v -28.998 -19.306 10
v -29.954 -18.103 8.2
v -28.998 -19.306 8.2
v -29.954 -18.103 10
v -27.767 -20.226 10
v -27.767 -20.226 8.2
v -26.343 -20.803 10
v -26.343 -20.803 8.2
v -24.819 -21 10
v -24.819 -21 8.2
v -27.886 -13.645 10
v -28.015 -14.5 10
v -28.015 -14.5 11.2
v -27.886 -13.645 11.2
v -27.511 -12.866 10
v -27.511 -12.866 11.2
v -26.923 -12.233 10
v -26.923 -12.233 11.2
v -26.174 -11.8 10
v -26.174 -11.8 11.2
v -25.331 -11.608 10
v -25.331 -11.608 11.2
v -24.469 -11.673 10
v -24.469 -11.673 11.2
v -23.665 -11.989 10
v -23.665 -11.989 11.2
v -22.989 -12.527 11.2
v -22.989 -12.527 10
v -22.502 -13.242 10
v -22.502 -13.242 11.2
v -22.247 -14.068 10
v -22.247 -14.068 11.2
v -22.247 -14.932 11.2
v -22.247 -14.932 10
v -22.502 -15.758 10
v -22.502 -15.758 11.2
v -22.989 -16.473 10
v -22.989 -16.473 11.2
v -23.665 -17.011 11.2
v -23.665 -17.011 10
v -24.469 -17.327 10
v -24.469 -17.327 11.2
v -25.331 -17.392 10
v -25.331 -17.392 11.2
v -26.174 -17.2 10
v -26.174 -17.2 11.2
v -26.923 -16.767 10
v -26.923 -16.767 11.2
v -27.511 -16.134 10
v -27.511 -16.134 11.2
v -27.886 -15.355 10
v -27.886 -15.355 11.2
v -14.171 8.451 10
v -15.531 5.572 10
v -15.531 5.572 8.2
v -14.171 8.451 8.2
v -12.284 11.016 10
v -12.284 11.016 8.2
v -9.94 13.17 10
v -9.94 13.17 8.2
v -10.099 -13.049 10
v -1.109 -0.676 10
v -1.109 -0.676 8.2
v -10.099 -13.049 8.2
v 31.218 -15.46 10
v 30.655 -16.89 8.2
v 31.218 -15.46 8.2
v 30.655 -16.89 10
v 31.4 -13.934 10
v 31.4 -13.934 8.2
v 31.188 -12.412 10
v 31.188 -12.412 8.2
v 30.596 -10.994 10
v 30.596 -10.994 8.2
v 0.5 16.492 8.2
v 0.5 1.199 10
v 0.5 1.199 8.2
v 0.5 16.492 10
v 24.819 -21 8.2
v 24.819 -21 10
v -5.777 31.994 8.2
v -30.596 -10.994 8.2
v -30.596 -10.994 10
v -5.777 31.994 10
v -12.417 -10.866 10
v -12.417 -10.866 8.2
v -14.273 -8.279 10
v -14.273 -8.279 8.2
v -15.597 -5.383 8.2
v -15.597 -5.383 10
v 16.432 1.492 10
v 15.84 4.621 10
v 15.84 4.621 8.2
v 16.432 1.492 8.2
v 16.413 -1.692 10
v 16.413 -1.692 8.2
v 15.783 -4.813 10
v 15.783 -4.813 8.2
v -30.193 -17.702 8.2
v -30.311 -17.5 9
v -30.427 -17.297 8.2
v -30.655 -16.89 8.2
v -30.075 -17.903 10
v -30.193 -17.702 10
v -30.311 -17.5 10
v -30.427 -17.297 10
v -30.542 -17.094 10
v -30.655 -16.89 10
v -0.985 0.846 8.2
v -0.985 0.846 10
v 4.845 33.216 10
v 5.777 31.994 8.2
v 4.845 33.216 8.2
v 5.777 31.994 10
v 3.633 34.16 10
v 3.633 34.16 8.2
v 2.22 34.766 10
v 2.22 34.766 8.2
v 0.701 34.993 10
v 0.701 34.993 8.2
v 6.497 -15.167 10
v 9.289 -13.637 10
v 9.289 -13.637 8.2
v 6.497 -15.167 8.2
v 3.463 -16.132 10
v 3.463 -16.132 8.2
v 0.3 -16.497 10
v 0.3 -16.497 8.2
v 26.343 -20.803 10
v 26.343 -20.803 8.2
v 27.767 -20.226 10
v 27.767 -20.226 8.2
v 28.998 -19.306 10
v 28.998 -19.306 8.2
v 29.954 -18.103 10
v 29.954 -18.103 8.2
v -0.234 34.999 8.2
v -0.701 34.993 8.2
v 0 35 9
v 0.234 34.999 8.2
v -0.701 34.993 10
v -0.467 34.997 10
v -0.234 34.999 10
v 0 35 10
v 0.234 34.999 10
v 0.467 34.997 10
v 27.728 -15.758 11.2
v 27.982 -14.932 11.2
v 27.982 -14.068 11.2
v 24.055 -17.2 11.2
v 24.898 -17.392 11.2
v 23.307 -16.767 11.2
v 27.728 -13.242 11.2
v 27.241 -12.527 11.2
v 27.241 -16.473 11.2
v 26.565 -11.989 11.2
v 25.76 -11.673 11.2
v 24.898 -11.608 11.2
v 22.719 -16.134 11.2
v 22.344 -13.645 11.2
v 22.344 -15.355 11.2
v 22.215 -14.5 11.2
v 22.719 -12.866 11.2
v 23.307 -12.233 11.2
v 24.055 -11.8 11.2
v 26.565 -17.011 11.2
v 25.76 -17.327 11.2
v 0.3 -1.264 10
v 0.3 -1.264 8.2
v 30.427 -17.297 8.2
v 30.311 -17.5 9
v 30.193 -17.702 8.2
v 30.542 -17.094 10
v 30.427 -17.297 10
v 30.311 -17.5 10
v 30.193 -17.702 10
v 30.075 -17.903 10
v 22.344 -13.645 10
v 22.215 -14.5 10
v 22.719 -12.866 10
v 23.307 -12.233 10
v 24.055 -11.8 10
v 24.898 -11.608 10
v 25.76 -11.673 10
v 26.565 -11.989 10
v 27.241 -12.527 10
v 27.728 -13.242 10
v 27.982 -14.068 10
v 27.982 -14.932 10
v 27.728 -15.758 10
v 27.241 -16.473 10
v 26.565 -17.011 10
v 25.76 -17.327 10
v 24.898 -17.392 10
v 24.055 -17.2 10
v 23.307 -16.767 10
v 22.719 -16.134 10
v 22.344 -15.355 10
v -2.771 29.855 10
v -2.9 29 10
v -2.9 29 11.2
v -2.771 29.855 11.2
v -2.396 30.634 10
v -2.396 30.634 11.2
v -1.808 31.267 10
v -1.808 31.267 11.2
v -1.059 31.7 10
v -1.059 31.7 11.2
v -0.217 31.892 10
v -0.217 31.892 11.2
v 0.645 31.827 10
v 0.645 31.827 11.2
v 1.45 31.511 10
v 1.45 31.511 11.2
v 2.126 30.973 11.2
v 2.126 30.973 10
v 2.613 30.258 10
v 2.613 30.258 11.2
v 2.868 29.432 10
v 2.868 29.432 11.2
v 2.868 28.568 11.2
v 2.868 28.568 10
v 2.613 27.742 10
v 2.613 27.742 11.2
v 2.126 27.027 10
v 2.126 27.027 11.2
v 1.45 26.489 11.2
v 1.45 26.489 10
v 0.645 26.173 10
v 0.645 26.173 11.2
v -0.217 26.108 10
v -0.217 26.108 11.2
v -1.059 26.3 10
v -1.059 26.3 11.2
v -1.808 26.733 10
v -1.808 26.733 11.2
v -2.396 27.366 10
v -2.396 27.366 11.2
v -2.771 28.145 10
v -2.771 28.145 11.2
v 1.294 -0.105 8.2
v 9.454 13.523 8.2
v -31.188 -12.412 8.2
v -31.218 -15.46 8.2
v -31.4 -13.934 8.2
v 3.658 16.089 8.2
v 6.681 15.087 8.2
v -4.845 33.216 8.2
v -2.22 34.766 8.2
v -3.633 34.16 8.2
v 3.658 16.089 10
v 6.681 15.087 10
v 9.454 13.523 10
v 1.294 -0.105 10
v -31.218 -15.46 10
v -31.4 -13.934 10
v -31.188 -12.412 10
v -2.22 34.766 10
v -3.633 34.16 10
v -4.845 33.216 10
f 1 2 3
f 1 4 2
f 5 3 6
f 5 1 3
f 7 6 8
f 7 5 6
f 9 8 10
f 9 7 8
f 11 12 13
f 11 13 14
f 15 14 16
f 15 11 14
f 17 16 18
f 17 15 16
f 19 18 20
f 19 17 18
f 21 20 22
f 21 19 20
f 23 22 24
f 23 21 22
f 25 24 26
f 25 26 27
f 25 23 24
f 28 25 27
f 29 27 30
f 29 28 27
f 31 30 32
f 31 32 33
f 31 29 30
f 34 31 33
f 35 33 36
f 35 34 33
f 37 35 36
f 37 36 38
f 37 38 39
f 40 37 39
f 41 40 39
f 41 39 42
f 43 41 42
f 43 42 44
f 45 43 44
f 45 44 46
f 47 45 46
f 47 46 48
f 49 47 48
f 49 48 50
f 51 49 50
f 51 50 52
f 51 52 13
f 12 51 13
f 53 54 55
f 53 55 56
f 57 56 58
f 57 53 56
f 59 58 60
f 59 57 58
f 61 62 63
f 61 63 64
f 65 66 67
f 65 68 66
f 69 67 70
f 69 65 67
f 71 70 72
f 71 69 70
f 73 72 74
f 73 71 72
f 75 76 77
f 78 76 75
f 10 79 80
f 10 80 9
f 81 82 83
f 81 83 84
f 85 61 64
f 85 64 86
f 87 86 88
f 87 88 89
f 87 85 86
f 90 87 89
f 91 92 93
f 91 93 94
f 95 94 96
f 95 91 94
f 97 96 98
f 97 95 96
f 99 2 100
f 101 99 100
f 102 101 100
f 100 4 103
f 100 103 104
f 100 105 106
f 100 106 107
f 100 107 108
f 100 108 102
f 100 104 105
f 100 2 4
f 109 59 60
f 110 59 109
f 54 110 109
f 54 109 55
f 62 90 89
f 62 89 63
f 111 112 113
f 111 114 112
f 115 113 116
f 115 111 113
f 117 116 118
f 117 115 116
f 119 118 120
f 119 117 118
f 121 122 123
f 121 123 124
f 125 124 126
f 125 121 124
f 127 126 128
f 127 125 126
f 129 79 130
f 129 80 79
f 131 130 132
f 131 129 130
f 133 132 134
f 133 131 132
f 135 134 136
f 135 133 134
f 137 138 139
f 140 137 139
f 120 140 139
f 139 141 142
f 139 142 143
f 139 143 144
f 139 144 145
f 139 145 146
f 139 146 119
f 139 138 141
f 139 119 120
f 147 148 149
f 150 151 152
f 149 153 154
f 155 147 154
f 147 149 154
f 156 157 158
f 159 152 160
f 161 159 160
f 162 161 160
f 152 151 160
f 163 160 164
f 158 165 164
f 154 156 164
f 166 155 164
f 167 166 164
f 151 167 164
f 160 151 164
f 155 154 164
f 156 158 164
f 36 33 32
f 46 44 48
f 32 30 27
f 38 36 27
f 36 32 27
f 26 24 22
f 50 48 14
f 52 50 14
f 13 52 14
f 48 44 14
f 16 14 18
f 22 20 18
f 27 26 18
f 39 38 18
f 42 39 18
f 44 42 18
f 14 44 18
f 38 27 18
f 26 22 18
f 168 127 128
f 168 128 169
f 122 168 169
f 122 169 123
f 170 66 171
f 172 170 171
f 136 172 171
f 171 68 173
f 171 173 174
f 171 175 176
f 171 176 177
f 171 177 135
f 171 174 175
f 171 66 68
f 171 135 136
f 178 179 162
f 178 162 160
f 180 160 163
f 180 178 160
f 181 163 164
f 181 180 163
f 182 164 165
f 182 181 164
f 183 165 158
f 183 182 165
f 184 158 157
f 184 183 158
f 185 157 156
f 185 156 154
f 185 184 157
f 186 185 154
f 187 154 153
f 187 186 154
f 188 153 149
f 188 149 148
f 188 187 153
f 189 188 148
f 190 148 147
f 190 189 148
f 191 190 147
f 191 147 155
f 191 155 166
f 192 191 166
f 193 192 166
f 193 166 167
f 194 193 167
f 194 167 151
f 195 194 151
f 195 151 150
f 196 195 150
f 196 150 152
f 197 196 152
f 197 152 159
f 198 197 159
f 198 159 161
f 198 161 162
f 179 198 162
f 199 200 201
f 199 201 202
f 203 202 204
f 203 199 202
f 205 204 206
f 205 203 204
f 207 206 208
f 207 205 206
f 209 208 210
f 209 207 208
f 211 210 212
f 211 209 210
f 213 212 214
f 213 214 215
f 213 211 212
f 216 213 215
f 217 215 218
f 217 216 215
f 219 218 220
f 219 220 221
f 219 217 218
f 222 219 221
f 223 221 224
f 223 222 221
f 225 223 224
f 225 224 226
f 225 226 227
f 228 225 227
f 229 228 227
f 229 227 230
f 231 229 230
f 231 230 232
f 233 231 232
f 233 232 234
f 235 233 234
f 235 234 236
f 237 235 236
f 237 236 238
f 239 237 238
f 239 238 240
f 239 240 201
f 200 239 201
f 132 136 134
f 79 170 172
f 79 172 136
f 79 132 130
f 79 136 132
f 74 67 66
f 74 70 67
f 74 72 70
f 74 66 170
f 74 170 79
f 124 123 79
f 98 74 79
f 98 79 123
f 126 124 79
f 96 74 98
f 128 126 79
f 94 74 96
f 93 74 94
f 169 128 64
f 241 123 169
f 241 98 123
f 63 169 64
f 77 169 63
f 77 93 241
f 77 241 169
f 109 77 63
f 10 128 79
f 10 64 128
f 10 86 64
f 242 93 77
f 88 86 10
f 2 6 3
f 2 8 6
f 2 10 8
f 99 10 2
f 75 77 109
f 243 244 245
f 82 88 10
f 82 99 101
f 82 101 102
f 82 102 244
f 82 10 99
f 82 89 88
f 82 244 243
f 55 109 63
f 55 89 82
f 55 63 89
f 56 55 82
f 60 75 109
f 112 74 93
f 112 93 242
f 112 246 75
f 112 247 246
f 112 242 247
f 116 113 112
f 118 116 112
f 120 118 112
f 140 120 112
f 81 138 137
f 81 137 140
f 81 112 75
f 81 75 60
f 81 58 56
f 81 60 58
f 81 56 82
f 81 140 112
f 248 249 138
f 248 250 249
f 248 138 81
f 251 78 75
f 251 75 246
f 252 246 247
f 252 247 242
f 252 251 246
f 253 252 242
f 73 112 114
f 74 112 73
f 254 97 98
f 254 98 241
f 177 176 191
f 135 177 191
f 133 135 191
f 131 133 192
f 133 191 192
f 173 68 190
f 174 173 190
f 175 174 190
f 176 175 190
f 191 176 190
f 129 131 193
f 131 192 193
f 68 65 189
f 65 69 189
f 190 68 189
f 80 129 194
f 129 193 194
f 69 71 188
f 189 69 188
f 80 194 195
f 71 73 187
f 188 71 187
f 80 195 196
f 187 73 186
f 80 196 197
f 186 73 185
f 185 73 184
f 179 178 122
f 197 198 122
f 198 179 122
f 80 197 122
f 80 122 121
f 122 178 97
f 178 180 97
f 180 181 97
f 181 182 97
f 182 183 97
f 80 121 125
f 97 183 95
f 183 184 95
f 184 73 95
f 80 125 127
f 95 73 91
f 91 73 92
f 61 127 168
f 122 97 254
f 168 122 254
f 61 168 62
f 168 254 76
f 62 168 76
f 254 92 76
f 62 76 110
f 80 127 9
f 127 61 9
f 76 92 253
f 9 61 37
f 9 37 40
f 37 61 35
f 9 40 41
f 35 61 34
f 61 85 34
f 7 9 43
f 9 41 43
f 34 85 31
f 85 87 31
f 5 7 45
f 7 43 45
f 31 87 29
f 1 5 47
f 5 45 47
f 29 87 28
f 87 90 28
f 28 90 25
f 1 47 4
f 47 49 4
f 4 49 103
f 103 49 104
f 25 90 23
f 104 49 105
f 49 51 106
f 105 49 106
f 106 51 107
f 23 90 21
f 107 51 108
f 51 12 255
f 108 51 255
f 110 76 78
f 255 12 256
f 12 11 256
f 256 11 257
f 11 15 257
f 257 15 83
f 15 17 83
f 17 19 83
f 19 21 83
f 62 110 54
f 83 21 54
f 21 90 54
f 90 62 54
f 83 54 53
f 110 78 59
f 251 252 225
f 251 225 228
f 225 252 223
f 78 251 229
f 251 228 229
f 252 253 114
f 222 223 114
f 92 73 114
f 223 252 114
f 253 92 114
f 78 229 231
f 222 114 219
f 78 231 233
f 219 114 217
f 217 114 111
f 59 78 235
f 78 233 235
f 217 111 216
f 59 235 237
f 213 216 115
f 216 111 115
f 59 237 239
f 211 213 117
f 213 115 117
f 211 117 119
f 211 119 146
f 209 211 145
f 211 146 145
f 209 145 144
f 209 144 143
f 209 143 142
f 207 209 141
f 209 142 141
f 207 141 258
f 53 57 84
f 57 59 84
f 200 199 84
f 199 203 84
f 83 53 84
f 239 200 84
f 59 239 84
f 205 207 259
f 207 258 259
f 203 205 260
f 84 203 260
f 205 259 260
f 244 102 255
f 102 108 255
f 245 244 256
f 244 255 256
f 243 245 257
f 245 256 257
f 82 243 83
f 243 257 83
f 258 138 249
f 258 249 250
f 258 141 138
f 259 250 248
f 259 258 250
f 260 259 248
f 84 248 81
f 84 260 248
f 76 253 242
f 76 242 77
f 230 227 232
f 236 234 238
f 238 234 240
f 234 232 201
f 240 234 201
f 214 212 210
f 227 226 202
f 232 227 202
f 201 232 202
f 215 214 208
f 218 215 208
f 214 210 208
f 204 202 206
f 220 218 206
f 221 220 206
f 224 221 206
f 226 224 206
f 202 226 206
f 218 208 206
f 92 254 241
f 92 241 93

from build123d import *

# Parameters (mm, degrees)
SKETCH2_R           = 18
BOSS_EXTRUDE1_DEPTH = 1.8
BOSS_EXTRUDE7_START = -1.8
BOSS_EXTRUDE7_DEPTH = 1.8
SKETCH17_R          = 0.7
BOSS_EXTRUDE9_DEPTH = 1.8
BOSS_EXTRUDE2_START = -1.8
SKETCH3_R           = 35
SKETCH3_R_2         = 18
BOSS_EXTRUDE2_DEPTH = 1.8
SKETCH4_R           = 2.9
BOSS_EXTRUDE3_DEPTH = 3
SKETCH6_R           = 5
BOSS_EXTRUDE4_DEPTH = 1
SKETCH7_R           = 59.131365533
CUT_EXTRUDE1_DEPTH  = 10
FILLET1_R           = 6


with BuildPart() as part:
    # Sketch2 → Boss-Extrude1 (new body)
    with BuildSketch(Plane.XY.offset(10)):
        Circle(SKETCH2_R)
        with BuildLine():
            ThreePointArc((0, 0.538550206), (0.166421166, 0.512191682), (0.316551869, 0.435696269))
            Line((0.316551869, 0.435696269), (9.992349289, 13.753288904))
            ThreePointArc((9.992349289, 13.753288904), (13.753288904, 9.992349289), (16.167960777, 5.253288904))
            Line((16.167960777, 5.253288904), (0.512191682, 0.166421166))
            ThreePointArc((0.512191682, 0.166421166), (0.538550206, 0), (0.512191682, -0.166421166))
            Line((0.512191682, -0.166421166), (16.167960777, -5.253288904))
            ThreePointArc((16.167960777, -5.253288904), (13.753288904, -9.992349289), (9.992349289, -13.753288904))
            Line((9.992349289, -13.753288904), (0.316551869, -0.435696269))
            ThreePointArc((0.316551869, -0.435696269), (0.166421166, -0.512191682), (0, -0.538550206))
            Line((0, -0.538550206), (0, -17))
            ThreePointArc((0, -17), (-5.253288904, -16.167960777), (-9.992349289, -13.753288904))
            Line((-9.992349289, -13.753288904), (-0.316551869, -0.435696269))
            ThreePointArc((-0.316551869, -0.435696269), (-0.435696269, -0.316551869), (-0.512191682, -0.166421166))
            Line((-0.512191682, -0.166421166), (-16.167960777, -5.253288904))
            ThreePointArc((-16.167960777, -5.253288904), (-17, 0), (-16.167960777, 5.253288904))
            Line((-16.167960777, 5.253288904), (-0.512191682, 0.166421166))
            ThreePointArc((-0.512191682, 0.166421166), (-0.435696269, 0.316551869), (-0.316551869, 0.435696269))
            Line((-0.316551869, 0.435696269), (-9.992349289, 13.753288904))
            ThreePointArc((-9.992349289, 13.753288904), (-5.253288904, 16.167960777), (0, 17))
            Line((0, 17), (0, 0.538550206))
        make_face(mode=Mode.SUBTRACT)
        with BuildLine():
            Line((0.5, 1.198581445), (0.5, 16.492422502))
            ThreePointArc((0.5, 16.492422502), (5.193820321, 15.661233364), (9.454148381, 13.522909391))
            Line((9.454148381, 13.522909391), (0.5, 1.198581445))
        make_face(mode=Mode.SUBTRACT)
        with BuildLine():
            Line((-9.939558578, 13.170238239), (-0.985410197, 0.845910294))
            Line((-0.985410197, 0.845910294), (-15.530717393, 5.57196709))
            ThreePointArc((-15.530717393, 5.57196709), (-13.289739299, 9.779203923), (-9.939558578, 13.170238239))
        make_face(mode=Mode.SUBTRACT)
        with BuildLine():
            Line((-15.597133416, -5.383254519), (-1.109016994, -0.675780132))
            Line((-1.109016994, -0.675780132), (-10.098511219, -13.048757457))
            ThreePointArc((-10.098511219, -13.048757457), (-13.40733091, -9.617352956), (-15.597133416, -5.383254519))
        make_face(mode=Mode.SUBTRACT)
        with BuildLine():
            ThreePointArc((9.289494224, -13.636542709), (5.003553098, -15.723054932), (0.3, -16.497272502))
            Line((0.3, -16.497272502), (0.3, -1.263565384))
            Line((0.3, -1.263565384), (9.289494224, -13.636542709))
        make_face(mode=Mode.SUBTRACT)
        with BuildLine():
            Line((15.782543612, -4.812620609), (1.294427191, -0.105146222))
            Line((1.294427191, -0.105146222), (15.839734388, 4.620910574))
            ThreePointArc((15.839734388, 4.620910574), (16.499696789, -0.100029399), (15.782543612, -4.812620609))
        make_face(mode=Mode.SUBTRACT)
    extrude(amount=-BOSS_EXTRUDE1_DEPTH)

    # Sketch11 → Boss-Extrude7 (add)
    with BuildSketch(Plane(origin=(0, 0, 8.2), x_dir=(-1, 0, 0), z_dir=(0, 0, -1)).offset(BOSS_EXTRUDE7_START)):
        with BuildLine():
            ThreePointArc((-0.512191682, 0.166421166), (-0.435696269, 0.316551869), (-0.316551869, 0.435696269))
            Line((-0.316551869, 0.435696269), (-9.992349289, 13.753288904))
            ThreePointArc((-9.992349289, 13.753288904), (-13.753288904, 9.992349289), (-16.167960777, 5.253288904))
            Line((-16.167960777, 5.253288904), (-0.512191682, 0.166421166))
        make_face()
        with BuildLine():
            Line((0, 17), (0, 0.538550206))
            ThreePointArc((0, 0.538550206), (0.166421166, 0.512191682), (0.316551869, 0.435696269))
            Line((0.316551869, 0.435696269), (9.992349289, 13.753288904))
            ThreePointArc((9.992349289, 13.753288904), (5.253288904, 16.167960777), (0, 17))
        make_face()
        with BuildLine():
            Line((16.167960777, 5.253288904), (0.512191682, 0.166421166))
            ThreePointArc((0.512191682, 0.166421166), (0.531919759, 0.084247813), (0.538550206, 0))
            ThreePointArc((0.538550206, 0), (0.531919759, -0.084247813), (0.512191682, -0.166421166))
            Line((0.512191682, -0.166421166), (16.167960777, -5.253288904))
            ThreePointArc((16.167960777, -5.253288904), (17, 0), (16.167960777, 5.253288904))
        make_face()
        with BuildLine():
            Line((9.992349289, -13.753288904), (0.316551869, -0.435696269))
            ThreePointArc((0.316551869, -0.435696269), (0.166421166, -0.512191682), (0, -0.538550206))
            Line((0, -0.538550206), (0, -17))
            ThreePointArc((0, -17), (5.253288904, -16.167960777), (9.992349289, -13.753288904))
        make_face()
        with BuildLine():
            ThreePointArc((-0.316551869, -0.435696269), (-0.435696269, -0.316551869), (-0.512191682, -0.166421166))
            Line((-0.512191682, -0.166421166), (-16.167960777, -5.253288904))
            ThreePointArc((-16.167960777, -5.253288904), (-13.753288904, -9.992349289), (-9.992349289, -13.753288904))
            Line((-9.992349289, -13.753288904), (-0.316551869, -0.435696269))
        make_face()
        with BuildLine():
            ThreePointArc((0.316551869, 0.435696269), (0.166421166, 0.512191682), (0, 0.538550206))
            ThreePointArc((0, 0.538550206), (-0.166421166, 0.512191682), (-0.316551869, 0.435696269))
            ThreePointArc((-0.316551869, 0.435696269), (-0.435696269, 0.316551869), (-0.512191682, 0.166421166))
            ThreePointArc((-0.512191682, 0.166421166), (-0.538550206, 0), (-0.512191682, -0.166421166))
            ThreePointArc((-0.512191682, -0.166421166), (-0.435696269, -0.316551869), (-0.316551869, -0.435696269))
            ThreePointArc((-0.316551869, -0.435696269), (-0.166421166, -0.512191682), (0, -0.538550206))
            ThreePointArc((0, -0.538550206), (0.166421166, -0.512191682), (0.316551869, -0.435696269))
            ThreePointArc((0.316551869, -0.435696269), (0.435696269, -0.316551869), (0.512191682, -0.166421166))
            ThreePointArc((0.512191682, -0.166421166), (0.531919759, -0.084247813), (0.538550206, 0))
            ThreePointArc((0.538550206, 0), (0.531919759, 0.084247813), (0.512191682, 0.166421166))
            ThreePointArc((0.512191682, 0.166421166), (0.435696269, 0.316551869), (0.316551869, 0.435696269))
        make_face()
    extrude(amount=BOSS_EXTRUDE7_DEPTH)

    # Sketch17 → Boss-Extrude9 (add)
    with BuildSketch(Plane(origin=(0, 0, 8.2), x_dir=(-1, 0, 0), z_dir=(0, 0, -1))):
        Circle(SKETCH17_R)
    extrude(amount=-BOSS_EXTRUDE9_DEPTH)

    # Sketch3 → Boss-Extrude2 (add)
    with BuildSketch(Plane(origin=(0, 0, 8.2), x_dir=(-1, 0, 0), z_dir=(0, 0, -1)).offset(BOSS_EXTRUDE2_START)):
        Circle(SKETCH3_R)
        Circle(SKETCH3_R_2, mode=Mode.SUBTRACT)
    extrude(amount=BOSS_EXTRUDE2_DEPTH)

    # Sketch4 → Boss-Extrude3 (add)
    with BuildSketch(Plane(origin=(0, 0, 8.2), x_dir=(-1, 0, 0), z_dir=(0, 0, -1))):
        with Locations((0, 29)):
            Circle(SKETCH4_R)
        with Locations((25.11473671, -14.5)):
            Circle(SKETCH4_R)
        with Locations((-25.11473671, -14.5)):
            Circle(SKETCH4_R)
    extrude(amount=-BOSS_EXTRUDE3_DEPTH)

    # Sketch6 → Boss-Extrude4 (add)
    with BuildSketch(Plane(origin=(0, 0, 10), x_dir=(-1, 0, 0), z_dir=(0, 0, -1))):
        with Locations((0, 30)):
            Circle(SKETCH6_R)
        with Locations((25.980762114, -15)):
            Circle(SKETCH6_R)
        with Locations((-25.980762114, -15)):
            Circle(SKETCH6_R)
    extrude(amount=BOSS_EXTRUDE4_DEPTH)

    # Sketch7 → Cut-Extrude1 (cut)
    with BuildSketch(Plane(origin=(0, 0, 8.2), x_dir=(-1, 0, 0), z_dir=(0, 0, -1))):
        Circle(SKETCH7_R)
        Polygon((0, 42), (-36.373066959, -21), (36.373066959, -21), align=None, mode=Mode.SUBTRACT)
    extrude(amount=-CUT_EXTRUDE1_DEPTH, mode=Mode.SUBTRACT)

    # Fillet1
    fillet1_edges = [part.edges().sort_by_distance(p)[0] for p in [
        (4.186533479, 34.748711306, 9.1),
        (32.186533479, -13.748711306, 9.1),
        (28, -21, 9.1),
        (-28, -21, 9.1),
        (-32.186533479, -13.748711306, 9.1),
        (-4.186533479, 34.748711306, 9.1),
    ]]
    fillet(fillet1_edges, radius=FILLET1_R)


solid = part.part
